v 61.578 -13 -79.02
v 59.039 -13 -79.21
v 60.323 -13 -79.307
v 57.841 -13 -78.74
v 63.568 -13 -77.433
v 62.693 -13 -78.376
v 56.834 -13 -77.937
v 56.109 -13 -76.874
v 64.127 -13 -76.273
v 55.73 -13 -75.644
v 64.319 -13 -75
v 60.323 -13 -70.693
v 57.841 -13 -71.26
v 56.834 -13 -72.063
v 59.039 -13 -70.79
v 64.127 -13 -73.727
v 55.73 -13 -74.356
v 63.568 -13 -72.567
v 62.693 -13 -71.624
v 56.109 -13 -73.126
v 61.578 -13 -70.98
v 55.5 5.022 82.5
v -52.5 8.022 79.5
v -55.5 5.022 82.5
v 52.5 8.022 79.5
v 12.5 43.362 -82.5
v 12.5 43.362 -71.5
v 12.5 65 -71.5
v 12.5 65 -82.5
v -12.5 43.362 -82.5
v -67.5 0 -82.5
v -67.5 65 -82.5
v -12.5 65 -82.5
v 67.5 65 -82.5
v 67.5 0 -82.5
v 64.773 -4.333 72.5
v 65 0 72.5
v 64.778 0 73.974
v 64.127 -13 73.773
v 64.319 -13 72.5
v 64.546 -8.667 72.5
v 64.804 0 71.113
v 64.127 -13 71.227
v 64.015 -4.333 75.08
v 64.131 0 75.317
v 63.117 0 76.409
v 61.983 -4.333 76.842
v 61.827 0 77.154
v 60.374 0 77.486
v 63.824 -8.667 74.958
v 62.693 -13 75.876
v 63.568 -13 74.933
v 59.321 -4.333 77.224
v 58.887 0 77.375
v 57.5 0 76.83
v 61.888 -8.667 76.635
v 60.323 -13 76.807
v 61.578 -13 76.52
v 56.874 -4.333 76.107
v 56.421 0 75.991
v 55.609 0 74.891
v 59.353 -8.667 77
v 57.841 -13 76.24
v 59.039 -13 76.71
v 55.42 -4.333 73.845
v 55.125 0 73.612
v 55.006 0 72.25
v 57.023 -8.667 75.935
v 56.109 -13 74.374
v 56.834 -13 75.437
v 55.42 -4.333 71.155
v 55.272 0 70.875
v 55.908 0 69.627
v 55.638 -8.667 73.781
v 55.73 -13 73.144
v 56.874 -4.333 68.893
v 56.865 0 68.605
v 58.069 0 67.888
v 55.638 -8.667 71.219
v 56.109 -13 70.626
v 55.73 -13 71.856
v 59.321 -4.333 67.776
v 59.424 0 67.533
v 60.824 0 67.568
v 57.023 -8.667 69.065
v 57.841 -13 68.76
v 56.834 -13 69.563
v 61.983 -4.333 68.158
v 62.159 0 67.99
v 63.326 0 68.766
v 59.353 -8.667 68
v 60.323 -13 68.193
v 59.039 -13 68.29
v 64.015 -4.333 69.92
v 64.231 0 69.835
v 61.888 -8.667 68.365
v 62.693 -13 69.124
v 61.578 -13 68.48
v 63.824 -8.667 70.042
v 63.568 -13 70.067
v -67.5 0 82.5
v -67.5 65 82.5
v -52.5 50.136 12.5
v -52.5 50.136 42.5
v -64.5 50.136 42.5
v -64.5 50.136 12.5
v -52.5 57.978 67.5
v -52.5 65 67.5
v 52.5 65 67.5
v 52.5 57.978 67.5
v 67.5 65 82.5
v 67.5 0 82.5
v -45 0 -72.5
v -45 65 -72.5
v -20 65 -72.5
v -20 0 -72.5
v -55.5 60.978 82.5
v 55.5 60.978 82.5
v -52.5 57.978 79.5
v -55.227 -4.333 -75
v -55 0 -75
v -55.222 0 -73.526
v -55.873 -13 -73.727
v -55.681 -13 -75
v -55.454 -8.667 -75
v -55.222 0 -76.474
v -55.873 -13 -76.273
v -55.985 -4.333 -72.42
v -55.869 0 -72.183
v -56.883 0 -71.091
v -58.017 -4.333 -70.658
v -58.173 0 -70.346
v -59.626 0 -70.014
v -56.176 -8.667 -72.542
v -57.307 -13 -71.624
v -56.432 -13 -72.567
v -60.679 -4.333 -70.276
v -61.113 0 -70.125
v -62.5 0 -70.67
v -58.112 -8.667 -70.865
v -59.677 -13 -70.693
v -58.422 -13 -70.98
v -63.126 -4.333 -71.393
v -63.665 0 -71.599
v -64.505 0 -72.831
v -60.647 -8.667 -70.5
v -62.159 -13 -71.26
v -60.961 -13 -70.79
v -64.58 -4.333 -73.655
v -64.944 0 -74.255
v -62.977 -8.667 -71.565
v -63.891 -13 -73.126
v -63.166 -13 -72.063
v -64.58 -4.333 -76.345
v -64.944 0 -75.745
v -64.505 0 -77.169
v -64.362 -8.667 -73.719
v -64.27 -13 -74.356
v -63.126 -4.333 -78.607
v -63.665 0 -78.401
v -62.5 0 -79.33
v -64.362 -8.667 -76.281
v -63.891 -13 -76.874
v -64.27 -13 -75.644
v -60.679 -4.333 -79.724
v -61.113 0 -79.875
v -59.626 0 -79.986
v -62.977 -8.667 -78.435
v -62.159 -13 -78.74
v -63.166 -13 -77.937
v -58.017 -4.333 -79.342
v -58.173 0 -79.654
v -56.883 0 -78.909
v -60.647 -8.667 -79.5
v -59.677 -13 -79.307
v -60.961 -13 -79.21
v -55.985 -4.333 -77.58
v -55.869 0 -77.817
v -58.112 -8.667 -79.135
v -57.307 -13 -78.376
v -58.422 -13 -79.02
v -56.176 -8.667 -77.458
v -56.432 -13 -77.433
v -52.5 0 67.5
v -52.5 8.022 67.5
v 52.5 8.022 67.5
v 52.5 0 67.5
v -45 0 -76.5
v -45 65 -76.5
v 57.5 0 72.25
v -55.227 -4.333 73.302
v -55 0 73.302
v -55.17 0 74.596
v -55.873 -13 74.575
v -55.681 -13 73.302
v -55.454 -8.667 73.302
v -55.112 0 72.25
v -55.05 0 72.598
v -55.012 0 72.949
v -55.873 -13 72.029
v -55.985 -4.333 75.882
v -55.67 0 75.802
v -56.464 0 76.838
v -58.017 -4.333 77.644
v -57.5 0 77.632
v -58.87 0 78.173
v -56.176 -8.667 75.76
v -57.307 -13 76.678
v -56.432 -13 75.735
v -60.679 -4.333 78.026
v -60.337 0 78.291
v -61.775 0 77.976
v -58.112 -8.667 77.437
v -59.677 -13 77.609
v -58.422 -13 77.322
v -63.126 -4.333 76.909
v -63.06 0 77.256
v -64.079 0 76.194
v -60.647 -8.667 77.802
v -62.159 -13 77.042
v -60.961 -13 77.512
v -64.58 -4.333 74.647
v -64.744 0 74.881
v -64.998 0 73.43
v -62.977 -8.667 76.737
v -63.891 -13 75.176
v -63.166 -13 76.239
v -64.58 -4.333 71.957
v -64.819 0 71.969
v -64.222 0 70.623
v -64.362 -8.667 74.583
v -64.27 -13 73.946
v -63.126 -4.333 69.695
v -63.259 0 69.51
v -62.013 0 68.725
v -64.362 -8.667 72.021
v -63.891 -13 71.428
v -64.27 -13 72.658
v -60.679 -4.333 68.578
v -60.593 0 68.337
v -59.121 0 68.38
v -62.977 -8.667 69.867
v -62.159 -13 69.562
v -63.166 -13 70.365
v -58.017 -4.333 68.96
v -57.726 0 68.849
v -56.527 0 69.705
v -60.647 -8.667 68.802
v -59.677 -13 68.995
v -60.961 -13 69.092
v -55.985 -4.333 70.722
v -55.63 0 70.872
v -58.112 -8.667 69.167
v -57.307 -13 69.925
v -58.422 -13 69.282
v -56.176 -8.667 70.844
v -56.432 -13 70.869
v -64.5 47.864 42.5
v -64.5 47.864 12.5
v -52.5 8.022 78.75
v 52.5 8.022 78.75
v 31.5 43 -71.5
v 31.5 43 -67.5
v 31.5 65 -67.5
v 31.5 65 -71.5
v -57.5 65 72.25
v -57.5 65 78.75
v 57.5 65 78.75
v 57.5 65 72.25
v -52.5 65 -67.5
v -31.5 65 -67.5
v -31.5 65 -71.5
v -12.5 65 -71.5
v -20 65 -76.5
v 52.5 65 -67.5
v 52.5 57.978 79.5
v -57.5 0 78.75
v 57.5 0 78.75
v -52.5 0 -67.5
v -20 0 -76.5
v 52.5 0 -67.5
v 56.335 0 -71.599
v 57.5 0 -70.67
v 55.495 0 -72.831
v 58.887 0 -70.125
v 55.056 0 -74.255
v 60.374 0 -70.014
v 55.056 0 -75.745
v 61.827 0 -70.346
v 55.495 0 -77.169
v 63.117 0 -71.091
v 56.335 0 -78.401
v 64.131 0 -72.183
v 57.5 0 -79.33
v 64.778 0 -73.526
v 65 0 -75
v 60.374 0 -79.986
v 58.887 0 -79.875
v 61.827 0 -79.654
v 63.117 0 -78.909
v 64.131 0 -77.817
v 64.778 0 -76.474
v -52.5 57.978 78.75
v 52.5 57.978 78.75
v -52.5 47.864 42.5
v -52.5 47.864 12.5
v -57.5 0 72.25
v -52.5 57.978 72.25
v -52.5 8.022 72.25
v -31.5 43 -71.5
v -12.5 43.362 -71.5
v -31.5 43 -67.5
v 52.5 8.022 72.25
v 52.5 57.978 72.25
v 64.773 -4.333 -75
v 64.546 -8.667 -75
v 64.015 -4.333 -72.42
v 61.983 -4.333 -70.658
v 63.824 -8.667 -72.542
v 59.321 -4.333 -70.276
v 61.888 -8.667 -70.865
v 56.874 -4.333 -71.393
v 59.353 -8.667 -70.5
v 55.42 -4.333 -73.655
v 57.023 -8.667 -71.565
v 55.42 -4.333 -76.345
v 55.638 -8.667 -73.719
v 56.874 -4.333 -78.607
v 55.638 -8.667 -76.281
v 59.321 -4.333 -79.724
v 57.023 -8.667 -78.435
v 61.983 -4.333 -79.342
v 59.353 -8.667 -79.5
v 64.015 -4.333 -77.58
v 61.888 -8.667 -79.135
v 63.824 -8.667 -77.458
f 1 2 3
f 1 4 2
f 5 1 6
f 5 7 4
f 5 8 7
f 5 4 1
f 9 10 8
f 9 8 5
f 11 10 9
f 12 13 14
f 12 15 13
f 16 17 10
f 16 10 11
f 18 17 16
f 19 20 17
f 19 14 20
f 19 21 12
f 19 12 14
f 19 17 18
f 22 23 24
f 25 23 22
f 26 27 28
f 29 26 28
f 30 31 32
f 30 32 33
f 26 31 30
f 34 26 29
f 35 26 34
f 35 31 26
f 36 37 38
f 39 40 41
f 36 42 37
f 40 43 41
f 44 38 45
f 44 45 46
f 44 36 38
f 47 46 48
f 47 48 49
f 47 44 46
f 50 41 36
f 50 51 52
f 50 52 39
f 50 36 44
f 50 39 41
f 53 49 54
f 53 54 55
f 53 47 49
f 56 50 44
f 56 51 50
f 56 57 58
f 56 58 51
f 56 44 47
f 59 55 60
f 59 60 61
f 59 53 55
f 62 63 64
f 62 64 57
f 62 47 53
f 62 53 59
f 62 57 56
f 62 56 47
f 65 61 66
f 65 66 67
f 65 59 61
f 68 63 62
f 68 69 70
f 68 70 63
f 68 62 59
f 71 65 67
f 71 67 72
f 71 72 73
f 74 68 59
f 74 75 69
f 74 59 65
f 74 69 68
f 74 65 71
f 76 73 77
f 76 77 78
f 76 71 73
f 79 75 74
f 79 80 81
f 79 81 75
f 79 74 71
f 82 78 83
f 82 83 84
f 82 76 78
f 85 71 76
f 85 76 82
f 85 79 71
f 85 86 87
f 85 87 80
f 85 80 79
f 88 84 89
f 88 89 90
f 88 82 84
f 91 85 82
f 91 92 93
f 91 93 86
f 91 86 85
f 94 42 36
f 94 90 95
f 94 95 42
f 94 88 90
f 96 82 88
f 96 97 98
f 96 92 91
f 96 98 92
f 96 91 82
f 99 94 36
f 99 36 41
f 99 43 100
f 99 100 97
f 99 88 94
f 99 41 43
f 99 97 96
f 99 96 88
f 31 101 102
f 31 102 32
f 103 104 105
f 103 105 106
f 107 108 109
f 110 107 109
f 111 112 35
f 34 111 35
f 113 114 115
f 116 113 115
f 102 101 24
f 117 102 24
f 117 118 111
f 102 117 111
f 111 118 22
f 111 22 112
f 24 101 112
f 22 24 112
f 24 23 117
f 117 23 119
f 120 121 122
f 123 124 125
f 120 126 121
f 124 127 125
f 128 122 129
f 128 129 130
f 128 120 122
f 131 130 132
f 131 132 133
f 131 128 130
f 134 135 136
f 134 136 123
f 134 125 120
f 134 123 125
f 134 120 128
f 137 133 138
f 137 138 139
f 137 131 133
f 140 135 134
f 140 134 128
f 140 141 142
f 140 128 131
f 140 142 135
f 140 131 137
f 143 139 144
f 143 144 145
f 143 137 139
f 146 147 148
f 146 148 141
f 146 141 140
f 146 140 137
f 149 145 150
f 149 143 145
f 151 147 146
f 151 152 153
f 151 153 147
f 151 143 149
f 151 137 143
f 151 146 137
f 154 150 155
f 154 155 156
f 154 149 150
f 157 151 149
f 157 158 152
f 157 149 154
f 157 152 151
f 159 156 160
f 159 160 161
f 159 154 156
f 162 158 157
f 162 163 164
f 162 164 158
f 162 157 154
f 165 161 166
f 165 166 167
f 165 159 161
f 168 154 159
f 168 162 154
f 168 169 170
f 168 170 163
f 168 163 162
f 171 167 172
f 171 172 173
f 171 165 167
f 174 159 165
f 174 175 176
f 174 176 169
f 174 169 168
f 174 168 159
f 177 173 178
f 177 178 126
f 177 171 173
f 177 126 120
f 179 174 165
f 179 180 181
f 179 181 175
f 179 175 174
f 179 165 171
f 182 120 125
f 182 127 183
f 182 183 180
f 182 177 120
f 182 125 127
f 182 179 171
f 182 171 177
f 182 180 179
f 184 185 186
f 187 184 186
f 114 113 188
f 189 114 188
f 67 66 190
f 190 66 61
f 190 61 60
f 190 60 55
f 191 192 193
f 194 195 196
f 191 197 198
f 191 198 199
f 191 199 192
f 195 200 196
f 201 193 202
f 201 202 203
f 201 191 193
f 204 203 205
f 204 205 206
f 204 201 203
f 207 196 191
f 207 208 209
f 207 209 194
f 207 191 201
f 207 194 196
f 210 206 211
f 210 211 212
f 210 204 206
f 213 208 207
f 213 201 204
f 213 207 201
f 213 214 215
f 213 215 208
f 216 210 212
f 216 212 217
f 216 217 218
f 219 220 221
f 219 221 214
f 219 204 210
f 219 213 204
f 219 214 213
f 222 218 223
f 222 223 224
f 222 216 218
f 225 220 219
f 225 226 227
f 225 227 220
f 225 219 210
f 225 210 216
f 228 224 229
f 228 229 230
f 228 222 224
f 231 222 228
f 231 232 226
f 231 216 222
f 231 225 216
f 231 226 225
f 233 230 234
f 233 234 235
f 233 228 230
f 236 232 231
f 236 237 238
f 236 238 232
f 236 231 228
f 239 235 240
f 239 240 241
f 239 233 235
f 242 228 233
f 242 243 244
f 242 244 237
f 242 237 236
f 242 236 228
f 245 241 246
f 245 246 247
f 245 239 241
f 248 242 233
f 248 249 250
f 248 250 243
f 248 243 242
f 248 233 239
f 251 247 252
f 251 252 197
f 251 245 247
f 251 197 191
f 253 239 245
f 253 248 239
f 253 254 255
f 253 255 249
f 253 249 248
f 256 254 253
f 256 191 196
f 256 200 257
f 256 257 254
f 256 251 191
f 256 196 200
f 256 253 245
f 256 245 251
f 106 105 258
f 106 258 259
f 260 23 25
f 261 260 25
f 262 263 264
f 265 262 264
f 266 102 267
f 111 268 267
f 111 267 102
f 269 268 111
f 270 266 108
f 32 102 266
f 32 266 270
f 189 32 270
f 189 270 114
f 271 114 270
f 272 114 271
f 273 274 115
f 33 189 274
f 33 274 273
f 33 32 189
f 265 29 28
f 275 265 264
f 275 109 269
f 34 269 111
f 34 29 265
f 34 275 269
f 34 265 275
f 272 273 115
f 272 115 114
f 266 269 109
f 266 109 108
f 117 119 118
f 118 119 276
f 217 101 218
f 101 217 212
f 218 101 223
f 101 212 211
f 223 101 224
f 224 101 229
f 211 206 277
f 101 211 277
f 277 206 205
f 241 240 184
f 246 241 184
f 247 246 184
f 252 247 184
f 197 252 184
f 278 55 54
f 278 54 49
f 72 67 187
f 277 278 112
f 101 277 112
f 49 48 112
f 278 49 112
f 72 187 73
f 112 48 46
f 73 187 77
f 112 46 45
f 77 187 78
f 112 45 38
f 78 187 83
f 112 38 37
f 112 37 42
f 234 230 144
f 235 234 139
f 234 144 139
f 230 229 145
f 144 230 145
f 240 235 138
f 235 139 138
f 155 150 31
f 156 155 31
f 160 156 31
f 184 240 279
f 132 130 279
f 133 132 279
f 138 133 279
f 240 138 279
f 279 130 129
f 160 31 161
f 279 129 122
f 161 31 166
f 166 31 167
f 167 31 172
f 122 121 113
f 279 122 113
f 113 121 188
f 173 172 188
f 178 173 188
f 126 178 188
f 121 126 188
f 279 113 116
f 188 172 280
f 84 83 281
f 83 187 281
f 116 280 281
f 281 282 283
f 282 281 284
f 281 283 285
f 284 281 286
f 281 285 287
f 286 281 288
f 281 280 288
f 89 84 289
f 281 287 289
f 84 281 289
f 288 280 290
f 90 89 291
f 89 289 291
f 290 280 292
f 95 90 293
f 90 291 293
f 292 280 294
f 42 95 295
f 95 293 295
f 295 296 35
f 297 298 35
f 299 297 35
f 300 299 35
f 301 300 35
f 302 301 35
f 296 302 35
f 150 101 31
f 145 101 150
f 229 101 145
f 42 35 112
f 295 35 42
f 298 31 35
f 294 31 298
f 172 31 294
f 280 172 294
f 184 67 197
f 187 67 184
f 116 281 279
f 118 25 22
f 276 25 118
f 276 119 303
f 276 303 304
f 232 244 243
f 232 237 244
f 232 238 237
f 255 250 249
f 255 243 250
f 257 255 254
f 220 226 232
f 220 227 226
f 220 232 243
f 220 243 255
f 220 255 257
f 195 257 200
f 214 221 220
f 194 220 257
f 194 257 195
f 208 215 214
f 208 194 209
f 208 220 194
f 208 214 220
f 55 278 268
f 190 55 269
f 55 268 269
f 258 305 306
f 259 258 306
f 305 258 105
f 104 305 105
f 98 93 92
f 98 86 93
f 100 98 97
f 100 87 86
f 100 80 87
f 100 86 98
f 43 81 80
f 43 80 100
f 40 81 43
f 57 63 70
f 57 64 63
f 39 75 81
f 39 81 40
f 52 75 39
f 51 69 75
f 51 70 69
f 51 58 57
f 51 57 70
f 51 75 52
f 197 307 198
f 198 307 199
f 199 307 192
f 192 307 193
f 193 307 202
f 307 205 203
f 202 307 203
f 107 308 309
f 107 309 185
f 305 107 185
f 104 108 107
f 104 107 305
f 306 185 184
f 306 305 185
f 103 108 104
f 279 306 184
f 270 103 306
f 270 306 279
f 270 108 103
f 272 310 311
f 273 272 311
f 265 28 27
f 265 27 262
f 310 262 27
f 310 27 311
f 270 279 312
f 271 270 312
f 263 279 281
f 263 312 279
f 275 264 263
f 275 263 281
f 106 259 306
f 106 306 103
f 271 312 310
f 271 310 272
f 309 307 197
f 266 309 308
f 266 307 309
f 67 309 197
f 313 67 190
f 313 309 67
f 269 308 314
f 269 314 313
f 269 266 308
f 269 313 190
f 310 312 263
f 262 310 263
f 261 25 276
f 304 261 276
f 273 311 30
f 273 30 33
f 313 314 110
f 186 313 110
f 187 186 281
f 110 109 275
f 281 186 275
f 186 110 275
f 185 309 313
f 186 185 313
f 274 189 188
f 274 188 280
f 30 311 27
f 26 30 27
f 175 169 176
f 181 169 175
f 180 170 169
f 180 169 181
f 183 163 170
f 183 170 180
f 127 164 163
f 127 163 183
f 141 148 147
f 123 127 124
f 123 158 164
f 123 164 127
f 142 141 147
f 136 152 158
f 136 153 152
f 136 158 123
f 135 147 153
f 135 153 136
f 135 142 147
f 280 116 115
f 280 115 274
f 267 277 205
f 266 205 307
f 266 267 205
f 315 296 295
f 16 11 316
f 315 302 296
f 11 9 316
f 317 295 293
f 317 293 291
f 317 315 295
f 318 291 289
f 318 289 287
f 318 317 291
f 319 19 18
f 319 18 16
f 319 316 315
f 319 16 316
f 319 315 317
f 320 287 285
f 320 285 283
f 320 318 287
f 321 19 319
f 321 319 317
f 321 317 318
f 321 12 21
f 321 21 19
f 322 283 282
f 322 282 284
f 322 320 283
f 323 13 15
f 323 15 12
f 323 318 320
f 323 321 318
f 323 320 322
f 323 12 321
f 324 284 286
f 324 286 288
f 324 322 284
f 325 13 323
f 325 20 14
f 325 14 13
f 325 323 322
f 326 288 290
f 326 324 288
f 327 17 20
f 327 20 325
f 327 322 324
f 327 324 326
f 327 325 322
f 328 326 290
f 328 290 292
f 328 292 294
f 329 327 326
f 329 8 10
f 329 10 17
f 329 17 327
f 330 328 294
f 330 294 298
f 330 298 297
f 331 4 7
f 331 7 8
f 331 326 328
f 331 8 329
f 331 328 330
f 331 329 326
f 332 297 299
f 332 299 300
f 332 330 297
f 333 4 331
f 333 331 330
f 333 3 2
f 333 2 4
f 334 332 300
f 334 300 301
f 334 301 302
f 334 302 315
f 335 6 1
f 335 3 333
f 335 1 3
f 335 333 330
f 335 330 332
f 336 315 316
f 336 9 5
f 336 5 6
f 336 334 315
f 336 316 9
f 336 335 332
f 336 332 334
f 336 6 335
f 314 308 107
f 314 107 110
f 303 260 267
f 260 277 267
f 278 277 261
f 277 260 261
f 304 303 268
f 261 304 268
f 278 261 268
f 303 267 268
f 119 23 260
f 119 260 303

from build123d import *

# Parameters (mm, degrees)
SKETCH1_W           = 135
SKETCH1_H           = 165
BOSS_EXTRUDE1_DEPTH = 65
SKETCH2_W           = 105
SKETCH2_H           = 135
CUT_EXTRUDE1_DEPTH  = 66
SKETCH3_W           = 30
SKETCH3_H           = 2.27229553
CUT_EXTRUDE2_DEPTH  = 12
SKETCH4_W           = 25
SKETCH4_H           = 4
CUT_EXTRUDE3_DEPTH  = 66
SKETCH5_W           = 115
SKETCH5_H           = 6.5
CUT_EXTRUDE4_DEPTH  = 66
SKETCH7_R           = 5
BOSS_EXTRUDE2_DEPTH = 13
BOSS_EXTRUDE2_TAPER = 3
SKETCH8_R           = 5
BOSS_EXTRUDE3_DEPTH = 13
BOSS_EXTRUDE3_TAPER = 3
SKETCH9_R           = 5
BOSS_EXTRUDE4_DEPTH = 13
BOSS_EXTRUDE4_TAPER = 3
SKETCH10_W          = 105
SKETCH10_H          = 49.956638738
CUT_EXTRUDE5_DEPTH  = 15
CHAMFER3_SIZE       = 3
SKETCH14_W          = 63
SKETCH14_H          = 22
CUT_EXTRUDE6_DEPTH  = 4
SKETCH15_W          = 25
SKETCH15_H          = 25
CUT_EXTRUDE7_DEPTH  = 13


with BuildPart() as part:
    # Sketch1 → Boss-Extrude1 (new body)
    with BuildSketch(Plane(origin=(0, 0, 0), x_dir=(1, 0, 0), z_dir=(0, 1, 0))):
        Rectangle(SKETCH1_W, SKETCH1_H)
    extrude(amount=BOSS_EXTRUDE1_DEPTH)

    # Sketch2 → Cut-Extrude1 (cut, through all)
    with BuildSketch(Plane(origin=(0, 65, 0), x_dir=(1, 0, 0), z_dir=(0, 1, 0))):
        Rectangle(SKETCH2_W, SKETCH2_H)
    extrude(amount=-CUT_EXTRUDE1_DEPTH, mode=Mode.SUBTRACT)

    # Sketch3 → Cut-Extrude2 (cut)
    with BuildSketch(Plane(origin=(-52.5, 0, 0), x_dir=(0, 0, -1), z_dir=(1, 0, 0))):
        with Locations((-27.5, 49)):
            Rectangle(SKETCH3_W, SKETCH3_H)
    extrude(amount=-CUT_EXTRUDE2_DEPTH, mode=Mode.SUBTRACT)

    # Sketch4 → Cut-Extrude3 (cut, through all)
    with BuildSketch(Plane(origin=(0, 65, 0), x_dir=(1, 0, 0), z_dir=(0, 1, 0))):
        with Locations((-32.5, 74.5)):
            Rectangle(SKETCH4_W, SKETCH4_H)
    extrude(amount=-CUT_EXTRUDE3_DEPTH, mode=Mode.SUBTRACT)

    # Sketch5 → Cut-Extrude4 (cut, through all)
    with BuildSketch(Plane(origin=(0, 65, 0), x_dir=(1, 0, 0), z_dir=(0, 1, 0))):
        with Locations((0, -75.5)):
            Rectangle(SKETCH5_W, SKETCH5_H)
    extrude(amount=-CUT_EXTRUDE4_DEPTH, mode=Mode.SUBTRACT)

    # Sketch7 → Boss-Extrude2 (add)
    with BuildSketch(Plane.XZ):
        with Locations((-60, -75)):
            Circle(SKETCH7_R)
    extrude(amount=BOSS_EXTRUDE2_DEPTH, taper=BOSS_EXTRUDE2_TAPER)

    # Sketch8 → Boss-Extrude3 (add)
    with BuildSketch(Plane.XZ):
        with Locations((60, -75)):
            Circle(SKETCH8_R)
    extrude(amount=BOSS_EXTRUDE3_DEPTH, taper=BOSS_EXTRUDE3_TAPER)

    # Sketch9 → Boss-Extrude4 (add)
    with BuildSketch(Plane.XZ):
        with Locations((60, 72.5)):
            Circle(SKETCH9_R)
        with Locations((-60, 73.301994408)):
            Circle(SKETCH9_R)
    extrude(amount=BOSS_EXTRUDE4_DEPTH, taper=BOSS_EXTRUDE4_TAPER)

    # Sketch10 → Cut-Extrude5 (cut)
    with BuildSketch(Plane.XY.offset(82.5)):
        with Locations((0, 33)):
            Rectangle(SKETCH10_W, SKETCH10_H)
    extrude(amount=-CUT_EXTRUDE5_DEPTH, mode=Mode.SUBTRACT)

    # Chamfer3
    chamfer3_edges = [part.edges().sort_by_distance(p)[0] for p in [
        (52.5, 33, 82.5),
        (0, 57.978319369, 82.5),
        (-52.5, 33, 82.5),
        (0, 8.021680631, 82.5),
    ]]
    chamfer(chamfer3_edges, length=CHAMFER3_SIZE)

    # Sketch14 → Cut-Extrude6 (cut)
    with BuildSketch(Plane.XY.offset(-67.5)):
        with Locations((0, 54)):
            Rectangle(SKETCH14_W, SKETCH14_H)
    extrude(amount=-CUT_EXTRUDE6_DEPTH, mode=Mode.SUBTRACT)

    # Sketch15 → Cut-Extrude7 (cut)
    with BuildSketch(Plane.XY.offset(-71.5)):
        with Locations((0, 55.862062237)):
            Rectangle(SKETCH15_W, SKETCH15_H)
    extrude(amount=-CUT_EXTRUDE7_DEPTH, mode=Mode.SUBTRACT)


solid = part.part
